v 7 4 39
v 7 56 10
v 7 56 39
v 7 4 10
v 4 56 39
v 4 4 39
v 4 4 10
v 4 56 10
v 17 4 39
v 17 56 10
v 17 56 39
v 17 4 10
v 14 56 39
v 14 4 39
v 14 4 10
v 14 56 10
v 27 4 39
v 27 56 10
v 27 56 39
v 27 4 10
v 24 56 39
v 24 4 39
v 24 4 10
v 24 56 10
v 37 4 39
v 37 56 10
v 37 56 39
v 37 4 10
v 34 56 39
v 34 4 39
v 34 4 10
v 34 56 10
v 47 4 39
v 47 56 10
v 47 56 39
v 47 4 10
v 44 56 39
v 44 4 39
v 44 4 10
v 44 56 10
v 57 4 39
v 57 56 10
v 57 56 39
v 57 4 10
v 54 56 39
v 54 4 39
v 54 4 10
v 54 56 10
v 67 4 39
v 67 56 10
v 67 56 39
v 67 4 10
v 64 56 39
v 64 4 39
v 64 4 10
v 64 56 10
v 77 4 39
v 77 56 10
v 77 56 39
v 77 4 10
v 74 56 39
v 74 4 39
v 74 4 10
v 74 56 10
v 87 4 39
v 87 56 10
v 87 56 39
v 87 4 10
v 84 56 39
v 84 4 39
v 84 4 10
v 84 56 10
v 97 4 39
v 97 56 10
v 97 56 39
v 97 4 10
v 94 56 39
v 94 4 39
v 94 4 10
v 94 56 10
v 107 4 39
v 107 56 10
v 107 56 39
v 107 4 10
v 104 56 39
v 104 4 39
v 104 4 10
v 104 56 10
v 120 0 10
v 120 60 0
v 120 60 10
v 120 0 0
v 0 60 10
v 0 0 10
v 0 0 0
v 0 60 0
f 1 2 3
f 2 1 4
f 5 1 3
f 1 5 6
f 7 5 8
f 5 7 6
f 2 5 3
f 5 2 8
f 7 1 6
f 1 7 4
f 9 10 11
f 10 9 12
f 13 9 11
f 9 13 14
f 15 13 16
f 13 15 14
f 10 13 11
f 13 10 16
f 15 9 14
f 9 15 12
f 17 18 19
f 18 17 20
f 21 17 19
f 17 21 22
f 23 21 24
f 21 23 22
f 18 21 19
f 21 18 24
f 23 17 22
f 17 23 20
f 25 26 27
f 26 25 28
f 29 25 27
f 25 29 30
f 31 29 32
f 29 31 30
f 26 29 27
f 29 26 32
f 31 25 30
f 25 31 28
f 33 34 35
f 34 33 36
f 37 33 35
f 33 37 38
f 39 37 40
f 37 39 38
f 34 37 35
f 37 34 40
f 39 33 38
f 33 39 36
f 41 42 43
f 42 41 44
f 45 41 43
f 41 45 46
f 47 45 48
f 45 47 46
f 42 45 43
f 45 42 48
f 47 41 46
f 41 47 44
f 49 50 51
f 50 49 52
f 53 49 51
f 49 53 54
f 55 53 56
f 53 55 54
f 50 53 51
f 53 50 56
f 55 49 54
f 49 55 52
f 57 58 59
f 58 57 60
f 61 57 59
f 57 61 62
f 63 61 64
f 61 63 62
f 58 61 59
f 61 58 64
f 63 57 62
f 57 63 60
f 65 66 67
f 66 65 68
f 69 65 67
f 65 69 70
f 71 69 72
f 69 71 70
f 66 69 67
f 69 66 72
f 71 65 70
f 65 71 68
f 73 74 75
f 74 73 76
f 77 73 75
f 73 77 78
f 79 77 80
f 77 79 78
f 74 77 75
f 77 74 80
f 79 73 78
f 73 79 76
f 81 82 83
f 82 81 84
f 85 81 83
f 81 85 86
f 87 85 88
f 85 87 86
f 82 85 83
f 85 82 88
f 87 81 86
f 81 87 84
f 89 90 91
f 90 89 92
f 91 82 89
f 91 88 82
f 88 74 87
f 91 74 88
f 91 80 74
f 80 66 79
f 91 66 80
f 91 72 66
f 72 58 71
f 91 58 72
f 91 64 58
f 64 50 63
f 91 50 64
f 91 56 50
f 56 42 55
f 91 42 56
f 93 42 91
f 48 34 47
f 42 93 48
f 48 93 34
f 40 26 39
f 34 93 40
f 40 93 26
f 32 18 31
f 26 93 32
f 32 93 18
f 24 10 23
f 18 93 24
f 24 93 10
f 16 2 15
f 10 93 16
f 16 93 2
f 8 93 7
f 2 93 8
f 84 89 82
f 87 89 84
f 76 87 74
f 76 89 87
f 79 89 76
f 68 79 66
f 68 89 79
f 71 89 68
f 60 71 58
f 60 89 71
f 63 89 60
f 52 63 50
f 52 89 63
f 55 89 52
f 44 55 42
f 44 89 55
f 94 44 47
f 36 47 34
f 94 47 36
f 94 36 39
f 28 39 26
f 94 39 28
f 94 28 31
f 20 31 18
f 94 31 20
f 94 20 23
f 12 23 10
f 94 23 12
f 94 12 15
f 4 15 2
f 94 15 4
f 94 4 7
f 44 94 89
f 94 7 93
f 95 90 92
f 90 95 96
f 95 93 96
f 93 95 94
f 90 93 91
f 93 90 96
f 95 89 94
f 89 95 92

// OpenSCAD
$fn = 32;

// ----------------------------------------------------------------------
// Heatsink: uniform fin block
// ----------------------------------------------------------------------

// --- parameters (mm) ---
base_l = 120;             // base length, X
base_w = 60;              // base width, Y
base_t = 10;              // base plate thickness
fin_h = 30;               // fin height above the base
fin_t = 3;                // fin thickness
edge = 4;                 // margin from the base ends
pitch = 10;               // fin pitch

n_fins = floor((base_l - 2 * edge - fin_t) / pitch) + 1;  // fin count
total_h = base_t + fin_h - 1;  // overall height

union() {
  cube([base_l, base_w, base_t]);
  for (i = [0 : n_fins - 1])
    translate([edge + i * pitch, edge, base_t - 1])
      cube([fin_t, base_w - 2 * edge, fin_h]);
}
